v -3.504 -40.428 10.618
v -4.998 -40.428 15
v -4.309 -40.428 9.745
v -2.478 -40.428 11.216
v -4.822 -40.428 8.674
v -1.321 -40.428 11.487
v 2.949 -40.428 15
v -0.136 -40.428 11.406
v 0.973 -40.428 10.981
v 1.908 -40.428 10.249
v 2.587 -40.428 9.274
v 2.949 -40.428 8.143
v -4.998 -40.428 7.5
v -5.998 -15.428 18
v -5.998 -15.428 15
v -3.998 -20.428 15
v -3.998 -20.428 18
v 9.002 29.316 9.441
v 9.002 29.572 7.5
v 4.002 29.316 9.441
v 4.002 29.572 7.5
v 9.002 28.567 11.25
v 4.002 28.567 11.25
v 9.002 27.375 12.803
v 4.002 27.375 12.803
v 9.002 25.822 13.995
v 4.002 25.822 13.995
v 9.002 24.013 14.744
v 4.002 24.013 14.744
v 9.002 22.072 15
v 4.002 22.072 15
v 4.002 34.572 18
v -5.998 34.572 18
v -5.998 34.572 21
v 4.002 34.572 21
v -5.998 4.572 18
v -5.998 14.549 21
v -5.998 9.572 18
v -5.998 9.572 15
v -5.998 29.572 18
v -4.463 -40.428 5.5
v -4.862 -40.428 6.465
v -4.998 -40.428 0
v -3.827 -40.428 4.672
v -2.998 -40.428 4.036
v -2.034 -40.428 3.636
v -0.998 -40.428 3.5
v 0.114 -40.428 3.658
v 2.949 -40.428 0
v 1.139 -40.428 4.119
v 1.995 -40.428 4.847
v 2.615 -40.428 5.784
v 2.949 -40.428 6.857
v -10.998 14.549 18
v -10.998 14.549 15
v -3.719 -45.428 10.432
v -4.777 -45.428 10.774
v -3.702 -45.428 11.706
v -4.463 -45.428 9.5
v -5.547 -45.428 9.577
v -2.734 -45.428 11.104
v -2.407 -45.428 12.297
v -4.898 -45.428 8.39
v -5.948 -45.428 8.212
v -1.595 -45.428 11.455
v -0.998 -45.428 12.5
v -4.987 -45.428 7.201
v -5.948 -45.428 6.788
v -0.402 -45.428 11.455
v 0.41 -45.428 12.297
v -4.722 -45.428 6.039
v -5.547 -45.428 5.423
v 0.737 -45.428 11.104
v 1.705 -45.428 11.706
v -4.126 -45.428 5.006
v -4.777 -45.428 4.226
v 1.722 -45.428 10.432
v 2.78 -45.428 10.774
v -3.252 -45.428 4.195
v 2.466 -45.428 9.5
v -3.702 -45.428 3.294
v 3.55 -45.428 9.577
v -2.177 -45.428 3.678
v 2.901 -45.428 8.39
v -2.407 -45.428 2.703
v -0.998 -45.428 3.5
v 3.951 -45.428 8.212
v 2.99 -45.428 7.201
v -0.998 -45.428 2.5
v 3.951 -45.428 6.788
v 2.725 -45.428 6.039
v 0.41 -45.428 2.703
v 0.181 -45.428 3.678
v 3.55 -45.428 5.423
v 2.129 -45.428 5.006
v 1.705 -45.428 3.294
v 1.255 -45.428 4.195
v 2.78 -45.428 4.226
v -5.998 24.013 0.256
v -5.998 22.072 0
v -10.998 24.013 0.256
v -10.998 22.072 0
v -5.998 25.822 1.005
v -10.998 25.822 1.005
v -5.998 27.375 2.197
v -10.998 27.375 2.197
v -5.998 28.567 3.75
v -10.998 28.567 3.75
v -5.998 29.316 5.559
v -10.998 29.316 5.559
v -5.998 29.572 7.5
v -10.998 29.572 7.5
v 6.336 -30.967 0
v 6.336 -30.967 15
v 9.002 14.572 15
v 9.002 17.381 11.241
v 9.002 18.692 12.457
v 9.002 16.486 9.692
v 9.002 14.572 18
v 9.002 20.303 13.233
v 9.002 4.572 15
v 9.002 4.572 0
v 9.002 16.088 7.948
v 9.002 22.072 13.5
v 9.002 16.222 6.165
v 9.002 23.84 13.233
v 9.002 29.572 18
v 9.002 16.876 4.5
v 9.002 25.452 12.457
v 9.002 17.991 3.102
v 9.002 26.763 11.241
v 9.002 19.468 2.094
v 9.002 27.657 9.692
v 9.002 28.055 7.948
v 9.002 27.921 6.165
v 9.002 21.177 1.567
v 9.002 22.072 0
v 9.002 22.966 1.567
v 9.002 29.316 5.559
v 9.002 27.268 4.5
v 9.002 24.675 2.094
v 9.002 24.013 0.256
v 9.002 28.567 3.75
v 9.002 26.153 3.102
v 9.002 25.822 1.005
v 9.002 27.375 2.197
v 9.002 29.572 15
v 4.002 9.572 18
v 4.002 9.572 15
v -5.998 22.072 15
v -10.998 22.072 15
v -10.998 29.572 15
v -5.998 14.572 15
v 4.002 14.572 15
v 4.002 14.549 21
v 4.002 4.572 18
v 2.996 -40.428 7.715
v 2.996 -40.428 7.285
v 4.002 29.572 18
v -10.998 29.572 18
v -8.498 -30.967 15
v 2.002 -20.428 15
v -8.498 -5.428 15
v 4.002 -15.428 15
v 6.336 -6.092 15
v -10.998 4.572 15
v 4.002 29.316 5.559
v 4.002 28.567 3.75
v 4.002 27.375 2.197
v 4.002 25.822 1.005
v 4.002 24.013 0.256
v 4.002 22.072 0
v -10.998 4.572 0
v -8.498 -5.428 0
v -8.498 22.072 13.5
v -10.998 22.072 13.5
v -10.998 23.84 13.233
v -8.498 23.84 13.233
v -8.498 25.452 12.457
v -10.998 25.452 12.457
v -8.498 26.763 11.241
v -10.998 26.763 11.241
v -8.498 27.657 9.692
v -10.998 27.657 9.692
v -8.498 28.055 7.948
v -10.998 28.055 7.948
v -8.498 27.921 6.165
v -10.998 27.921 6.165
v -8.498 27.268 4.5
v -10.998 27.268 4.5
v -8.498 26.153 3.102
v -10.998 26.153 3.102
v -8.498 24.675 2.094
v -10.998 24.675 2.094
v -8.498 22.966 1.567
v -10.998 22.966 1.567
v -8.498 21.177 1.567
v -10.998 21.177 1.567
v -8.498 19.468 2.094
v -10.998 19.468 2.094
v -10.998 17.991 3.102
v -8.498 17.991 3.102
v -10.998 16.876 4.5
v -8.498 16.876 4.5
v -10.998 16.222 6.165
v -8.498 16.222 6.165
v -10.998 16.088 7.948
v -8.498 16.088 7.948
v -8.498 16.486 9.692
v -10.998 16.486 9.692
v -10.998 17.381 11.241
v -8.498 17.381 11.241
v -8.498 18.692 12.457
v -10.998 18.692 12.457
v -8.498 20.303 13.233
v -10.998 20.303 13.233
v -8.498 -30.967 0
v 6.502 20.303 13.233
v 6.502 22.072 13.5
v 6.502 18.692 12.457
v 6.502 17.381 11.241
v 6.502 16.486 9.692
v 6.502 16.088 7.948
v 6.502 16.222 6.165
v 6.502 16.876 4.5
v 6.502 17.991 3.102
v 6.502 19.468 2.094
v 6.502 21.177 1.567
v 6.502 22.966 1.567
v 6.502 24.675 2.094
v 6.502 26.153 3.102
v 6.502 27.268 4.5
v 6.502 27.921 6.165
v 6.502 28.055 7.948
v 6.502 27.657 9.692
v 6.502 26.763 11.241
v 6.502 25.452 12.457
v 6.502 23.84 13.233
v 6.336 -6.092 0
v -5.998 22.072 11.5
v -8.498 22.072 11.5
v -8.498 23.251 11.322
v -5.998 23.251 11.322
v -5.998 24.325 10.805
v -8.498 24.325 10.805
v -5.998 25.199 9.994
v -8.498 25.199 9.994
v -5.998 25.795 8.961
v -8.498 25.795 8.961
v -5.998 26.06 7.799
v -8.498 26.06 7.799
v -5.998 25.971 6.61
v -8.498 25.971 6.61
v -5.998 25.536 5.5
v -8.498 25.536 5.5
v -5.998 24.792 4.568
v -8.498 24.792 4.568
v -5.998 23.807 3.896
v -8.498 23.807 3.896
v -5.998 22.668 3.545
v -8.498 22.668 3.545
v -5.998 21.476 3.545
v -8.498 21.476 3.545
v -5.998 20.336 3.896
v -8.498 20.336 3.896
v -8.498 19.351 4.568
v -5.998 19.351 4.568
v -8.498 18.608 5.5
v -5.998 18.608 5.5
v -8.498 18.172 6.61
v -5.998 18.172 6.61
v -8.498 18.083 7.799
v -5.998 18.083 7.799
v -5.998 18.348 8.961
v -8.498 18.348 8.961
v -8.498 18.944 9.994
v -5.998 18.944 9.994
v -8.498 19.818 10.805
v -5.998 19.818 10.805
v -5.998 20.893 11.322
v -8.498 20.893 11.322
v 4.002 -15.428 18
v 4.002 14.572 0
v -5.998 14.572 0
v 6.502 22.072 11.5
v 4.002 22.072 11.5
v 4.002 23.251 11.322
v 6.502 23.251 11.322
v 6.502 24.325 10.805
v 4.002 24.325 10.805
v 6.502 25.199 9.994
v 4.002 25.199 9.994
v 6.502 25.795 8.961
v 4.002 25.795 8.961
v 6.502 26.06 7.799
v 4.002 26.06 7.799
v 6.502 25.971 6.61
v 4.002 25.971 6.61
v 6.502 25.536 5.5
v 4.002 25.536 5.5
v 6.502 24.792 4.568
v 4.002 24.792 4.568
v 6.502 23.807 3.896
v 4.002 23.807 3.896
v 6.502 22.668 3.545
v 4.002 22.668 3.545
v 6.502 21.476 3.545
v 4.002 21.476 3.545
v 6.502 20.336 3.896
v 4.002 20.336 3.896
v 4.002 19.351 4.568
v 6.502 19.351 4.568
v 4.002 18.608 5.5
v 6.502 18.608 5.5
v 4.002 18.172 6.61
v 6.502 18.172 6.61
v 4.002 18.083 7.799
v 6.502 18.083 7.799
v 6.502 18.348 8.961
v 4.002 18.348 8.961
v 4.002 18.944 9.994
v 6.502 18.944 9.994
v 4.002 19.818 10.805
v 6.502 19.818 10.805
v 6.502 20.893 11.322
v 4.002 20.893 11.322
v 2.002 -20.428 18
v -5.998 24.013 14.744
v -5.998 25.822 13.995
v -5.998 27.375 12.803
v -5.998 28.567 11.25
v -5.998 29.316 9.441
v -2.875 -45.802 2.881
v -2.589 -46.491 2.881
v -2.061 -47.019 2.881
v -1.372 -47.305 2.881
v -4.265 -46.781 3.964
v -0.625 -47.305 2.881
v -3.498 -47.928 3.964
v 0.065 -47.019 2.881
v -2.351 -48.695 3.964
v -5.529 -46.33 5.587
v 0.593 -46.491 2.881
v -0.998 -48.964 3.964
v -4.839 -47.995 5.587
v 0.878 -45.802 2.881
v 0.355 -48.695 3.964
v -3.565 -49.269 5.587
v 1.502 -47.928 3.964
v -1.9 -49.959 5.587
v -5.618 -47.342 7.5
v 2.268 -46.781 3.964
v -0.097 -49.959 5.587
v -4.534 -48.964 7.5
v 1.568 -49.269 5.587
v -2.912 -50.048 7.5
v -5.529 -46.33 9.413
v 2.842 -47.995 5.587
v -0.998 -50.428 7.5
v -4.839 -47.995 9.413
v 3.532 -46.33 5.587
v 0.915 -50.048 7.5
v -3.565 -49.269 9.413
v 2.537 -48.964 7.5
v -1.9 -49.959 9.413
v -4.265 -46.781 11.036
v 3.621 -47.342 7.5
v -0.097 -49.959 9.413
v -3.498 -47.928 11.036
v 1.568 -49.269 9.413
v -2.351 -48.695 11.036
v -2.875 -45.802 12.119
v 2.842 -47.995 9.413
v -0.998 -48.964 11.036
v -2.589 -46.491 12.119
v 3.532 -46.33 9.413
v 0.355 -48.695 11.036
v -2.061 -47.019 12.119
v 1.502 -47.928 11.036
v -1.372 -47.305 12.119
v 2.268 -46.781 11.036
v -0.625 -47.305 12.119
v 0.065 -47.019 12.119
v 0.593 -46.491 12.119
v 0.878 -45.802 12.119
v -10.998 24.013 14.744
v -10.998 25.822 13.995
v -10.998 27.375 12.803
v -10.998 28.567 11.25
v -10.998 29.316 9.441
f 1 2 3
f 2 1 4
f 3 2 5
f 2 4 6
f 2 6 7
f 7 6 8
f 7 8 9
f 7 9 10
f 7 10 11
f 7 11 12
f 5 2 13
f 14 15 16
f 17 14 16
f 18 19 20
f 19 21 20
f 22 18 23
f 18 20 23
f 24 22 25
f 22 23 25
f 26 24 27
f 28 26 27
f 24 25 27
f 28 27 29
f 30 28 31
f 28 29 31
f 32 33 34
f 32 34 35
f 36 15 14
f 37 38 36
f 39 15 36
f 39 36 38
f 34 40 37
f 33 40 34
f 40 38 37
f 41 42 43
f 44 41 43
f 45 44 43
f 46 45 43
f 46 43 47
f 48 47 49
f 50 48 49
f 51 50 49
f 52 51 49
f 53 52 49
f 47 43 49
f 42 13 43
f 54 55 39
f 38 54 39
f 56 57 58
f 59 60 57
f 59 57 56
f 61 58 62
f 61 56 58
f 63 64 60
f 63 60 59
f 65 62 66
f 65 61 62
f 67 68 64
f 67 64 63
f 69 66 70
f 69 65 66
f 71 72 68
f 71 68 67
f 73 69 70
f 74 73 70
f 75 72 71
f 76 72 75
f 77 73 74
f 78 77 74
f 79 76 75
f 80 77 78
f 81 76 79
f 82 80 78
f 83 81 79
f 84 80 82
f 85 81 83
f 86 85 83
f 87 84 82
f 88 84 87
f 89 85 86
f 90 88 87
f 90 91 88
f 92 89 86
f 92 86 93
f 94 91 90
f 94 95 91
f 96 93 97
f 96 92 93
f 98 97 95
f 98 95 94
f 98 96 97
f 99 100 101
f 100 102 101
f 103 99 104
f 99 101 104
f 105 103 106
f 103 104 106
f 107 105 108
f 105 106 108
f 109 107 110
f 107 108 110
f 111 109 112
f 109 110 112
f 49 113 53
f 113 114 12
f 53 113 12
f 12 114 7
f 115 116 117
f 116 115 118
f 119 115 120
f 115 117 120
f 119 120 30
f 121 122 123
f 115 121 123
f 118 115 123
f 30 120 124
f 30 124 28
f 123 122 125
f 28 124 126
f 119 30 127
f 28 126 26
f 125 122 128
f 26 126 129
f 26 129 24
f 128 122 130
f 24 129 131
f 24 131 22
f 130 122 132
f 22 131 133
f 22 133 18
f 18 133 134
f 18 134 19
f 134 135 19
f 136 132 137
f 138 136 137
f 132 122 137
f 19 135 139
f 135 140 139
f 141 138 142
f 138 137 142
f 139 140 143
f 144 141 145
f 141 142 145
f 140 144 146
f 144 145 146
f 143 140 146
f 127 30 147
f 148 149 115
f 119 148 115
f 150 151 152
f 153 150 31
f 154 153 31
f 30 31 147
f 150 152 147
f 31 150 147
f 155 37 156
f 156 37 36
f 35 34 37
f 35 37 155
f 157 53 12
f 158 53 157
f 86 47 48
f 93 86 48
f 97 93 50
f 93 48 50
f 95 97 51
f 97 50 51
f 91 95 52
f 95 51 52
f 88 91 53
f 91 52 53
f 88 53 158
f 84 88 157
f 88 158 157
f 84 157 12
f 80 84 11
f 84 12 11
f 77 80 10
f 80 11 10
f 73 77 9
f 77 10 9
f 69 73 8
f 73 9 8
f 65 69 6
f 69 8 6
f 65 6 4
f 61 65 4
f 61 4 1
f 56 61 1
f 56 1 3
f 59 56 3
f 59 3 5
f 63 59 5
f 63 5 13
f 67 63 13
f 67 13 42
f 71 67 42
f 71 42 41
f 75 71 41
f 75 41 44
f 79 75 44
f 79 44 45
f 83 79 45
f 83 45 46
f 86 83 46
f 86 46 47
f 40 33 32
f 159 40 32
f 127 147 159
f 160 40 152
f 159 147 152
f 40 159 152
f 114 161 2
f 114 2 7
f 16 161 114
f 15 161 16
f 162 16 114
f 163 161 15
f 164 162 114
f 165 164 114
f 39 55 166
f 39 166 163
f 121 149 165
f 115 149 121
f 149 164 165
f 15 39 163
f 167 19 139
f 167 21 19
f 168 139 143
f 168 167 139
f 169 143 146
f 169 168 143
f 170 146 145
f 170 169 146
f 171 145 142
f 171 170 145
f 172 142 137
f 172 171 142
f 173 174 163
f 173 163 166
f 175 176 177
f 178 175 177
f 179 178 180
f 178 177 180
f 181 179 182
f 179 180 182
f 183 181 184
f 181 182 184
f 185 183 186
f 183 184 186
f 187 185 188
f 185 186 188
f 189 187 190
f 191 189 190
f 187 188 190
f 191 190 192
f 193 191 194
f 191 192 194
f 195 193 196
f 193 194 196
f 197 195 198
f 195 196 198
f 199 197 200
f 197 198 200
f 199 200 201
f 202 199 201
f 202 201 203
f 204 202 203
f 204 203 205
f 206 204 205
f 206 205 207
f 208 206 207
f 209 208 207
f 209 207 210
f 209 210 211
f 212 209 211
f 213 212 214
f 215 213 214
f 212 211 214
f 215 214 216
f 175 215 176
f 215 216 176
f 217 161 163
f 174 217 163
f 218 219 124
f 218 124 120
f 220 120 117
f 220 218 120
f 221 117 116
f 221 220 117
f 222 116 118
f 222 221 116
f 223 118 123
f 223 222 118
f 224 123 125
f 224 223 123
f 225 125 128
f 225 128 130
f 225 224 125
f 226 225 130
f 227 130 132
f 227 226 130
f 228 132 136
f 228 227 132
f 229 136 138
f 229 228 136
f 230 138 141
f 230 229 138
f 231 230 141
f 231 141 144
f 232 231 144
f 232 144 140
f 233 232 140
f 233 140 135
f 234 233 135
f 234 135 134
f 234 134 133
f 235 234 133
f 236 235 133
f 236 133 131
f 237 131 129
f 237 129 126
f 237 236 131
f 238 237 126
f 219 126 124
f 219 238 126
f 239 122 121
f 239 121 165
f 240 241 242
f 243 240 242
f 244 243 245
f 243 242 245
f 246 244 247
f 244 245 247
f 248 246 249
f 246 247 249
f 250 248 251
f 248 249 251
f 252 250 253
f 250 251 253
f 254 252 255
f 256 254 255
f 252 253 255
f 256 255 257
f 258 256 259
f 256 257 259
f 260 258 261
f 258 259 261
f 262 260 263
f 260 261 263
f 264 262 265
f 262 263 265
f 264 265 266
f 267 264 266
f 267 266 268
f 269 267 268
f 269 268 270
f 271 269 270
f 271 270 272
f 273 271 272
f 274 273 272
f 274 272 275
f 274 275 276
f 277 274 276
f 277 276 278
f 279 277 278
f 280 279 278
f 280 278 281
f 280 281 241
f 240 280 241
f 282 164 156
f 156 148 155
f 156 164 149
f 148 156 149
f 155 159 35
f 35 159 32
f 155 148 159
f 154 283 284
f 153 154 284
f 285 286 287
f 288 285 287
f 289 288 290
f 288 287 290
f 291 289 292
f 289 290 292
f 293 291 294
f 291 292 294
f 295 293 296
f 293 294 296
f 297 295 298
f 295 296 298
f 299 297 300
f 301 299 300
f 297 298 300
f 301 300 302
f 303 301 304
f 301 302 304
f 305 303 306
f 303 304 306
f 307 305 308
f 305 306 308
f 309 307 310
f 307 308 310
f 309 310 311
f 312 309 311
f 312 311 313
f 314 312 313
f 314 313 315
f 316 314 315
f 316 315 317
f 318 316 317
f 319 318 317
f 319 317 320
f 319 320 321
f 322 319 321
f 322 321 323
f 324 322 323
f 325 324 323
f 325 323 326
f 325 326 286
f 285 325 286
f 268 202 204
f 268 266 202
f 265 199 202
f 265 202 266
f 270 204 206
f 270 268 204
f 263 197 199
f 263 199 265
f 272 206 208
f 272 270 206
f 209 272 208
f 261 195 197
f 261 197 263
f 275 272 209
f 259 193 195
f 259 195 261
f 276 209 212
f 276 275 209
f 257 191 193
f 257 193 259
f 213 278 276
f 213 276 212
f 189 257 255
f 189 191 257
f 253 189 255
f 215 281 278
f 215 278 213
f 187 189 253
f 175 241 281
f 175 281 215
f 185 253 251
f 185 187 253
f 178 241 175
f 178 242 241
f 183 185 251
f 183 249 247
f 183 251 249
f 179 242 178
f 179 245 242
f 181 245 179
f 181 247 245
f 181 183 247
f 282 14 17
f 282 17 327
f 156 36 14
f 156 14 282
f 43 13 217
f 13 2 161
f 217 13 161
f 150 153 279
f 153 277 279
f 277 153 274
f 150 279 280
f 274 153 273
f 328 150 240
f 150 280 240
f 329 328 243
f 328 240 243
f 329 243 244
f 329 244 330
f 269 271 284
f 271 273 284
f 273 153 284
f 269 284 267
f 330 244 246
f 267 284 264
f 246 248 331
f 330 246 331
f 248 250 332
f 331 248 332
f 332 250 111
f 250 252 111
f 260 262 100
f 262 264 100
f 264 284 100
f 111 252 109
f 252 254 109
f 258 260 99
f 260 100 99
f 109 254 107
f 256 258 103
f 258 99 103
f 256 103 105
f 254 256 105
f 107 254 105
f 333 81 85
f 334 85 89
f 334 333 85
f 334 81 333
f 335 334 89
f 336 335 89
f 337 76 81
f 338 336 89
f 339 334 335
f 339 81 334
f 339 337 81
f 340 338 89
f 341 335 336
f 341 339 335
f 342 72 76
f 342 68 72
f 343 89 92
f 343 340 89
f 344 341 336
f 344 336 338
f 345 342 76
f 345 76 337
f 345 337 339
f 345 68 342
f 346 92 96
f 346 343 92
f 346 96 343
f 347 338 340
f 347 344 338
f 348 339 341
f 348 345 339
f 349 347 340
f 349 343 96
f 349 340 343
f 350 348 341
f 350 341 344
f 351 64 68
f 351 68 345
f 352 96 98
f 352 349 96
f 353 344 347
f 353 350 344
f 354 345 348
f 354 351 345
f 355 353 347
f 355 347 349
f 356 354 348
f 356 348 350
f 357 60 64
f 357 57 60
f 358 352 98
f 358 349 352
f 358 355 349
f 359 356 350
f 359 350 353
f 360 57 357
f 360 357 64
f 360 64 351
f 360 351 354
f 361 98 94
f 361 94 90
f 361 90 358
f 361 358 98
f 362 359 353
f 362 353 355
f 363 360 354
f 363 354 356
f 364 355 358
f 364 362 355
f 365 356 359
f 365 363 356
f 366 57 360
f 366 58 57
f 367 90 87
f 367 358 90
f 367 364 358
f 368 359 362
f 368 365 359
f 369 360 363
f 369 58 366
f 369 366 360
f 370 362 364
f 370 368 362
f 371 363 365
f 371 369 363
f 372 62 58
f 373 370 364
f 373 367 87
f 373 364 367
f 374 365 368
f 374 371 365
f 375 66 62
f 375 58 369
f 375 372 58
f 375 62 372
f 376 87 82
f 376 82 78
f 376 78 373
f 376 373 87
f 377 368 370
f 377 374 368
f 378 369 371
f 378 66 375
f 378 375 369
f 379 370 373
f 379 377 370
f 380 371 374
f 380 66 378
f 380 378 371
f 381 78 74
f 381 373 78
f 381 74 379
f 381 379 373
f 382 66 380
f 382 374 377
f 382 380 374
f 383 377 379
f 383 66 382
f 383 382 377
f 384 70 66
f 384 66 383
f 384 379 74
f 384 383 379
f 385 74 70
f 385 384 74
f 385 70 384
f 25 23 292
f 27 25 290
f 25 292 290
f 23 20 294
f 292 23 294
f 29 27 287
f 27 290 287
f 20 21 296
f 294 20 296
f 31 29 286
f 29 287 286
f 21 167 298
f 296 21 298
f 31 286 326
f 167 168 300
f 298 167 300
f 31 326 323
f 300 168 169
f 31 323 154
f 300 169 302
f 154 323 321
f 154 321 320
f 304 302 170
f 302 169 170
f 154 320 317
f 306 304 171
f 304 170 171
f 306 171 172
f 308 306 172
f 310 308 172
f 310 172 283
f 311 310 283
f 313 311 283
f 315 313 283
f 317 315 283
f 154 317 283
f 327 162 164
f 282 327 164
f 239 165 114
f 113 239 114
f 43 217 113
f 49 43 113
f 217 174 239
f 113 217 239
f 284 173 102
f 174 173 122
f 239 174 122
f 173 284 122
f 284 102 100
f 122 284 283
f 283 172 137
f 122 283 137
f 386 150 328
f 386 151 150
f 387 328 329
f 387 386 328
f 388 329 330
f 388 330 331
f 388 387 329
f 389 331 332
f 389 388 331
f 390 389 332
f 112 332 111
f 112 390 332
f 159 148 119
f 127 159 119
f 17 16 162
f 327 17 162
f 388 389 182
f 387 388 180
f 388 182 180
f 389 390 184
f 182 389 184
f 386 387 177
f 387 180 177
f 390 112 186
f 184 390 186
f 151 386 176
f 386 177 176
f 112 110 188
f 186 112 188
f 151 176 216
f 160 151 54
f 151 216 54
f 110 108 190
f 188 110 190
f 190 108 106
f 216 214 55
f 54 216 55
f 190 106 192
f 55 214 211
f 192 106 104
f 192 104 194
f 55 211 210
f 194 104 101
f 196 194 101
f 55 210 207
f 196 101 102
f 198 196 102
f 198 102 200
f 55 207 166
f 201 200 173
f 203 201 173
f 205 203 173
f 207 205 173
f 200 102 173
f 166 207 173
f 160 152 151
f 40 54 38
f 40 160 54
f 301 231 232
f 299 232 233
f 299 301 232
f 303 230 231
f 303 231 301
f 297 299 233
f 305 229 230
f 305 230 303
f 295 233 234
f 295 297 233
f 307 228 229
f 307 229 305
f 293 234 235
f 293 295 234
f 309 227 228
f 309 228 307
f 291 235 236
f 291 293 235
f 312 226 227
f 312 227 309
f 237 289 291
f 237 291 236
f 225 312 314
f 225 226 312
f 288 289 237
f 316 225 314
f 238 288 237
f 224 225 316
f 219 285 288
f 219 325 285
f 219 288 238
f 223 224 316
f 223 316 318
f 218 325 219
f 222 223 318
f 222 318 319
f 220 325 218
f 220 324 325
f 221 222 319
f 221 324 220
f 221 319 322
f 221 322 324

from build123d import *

# Parameters (mm, degrees)
BOSS_EXTRUDE2_DEPTH = 15
SKETCH2_R           = 4
CUT_EXTRUDE1_DEPTH  = 20
SKETCH3_R           = 6
CUT_EXTRUDE2_DEPTH  = 2.5
CUT_EXTRUDE3_START  = -2.5
SKETCH4_R           = 6
CUT_EXTRUDE3_DEPTH  = 2.5
FILLET1_R           = 7.5
BOSS_EXTRUDE3_DEPTH = 3
SKETCH6_W           = 10
SKETCH6_H           = 30
BOSS_EXTRUDE4_DEPTH = 3
CUT_EXTRUDE4_DEPTH  = 10
SKETCH8_R           = 4
BOSS_EXTRUDE6_DEPTH = 5
REVOLVE3_ANGLE      = 180
CUT_EXTRUDE6_DEPTH  = 15


with BuildPart() as part:
    # Sketch1 → Boss-Extrude2 (new body)
    with BuildSketch(Plane.XY):
        Polygon((4.00158439, 29.571674002), (4.00158439, 14.571674002), (-5.99841561, 14.571674002), (-5.99841561, 29.571674002), (-10.99841561, 29.571674002), (-10.99841561, -40.428325998), (9.00158439, -40.428325998), (9.00158439, 29.571674002), align=None)
    extrude(amount=BOSS_EXTRUDE2_DEPTH)

    # Sketch2 → Cut-Extrude1 (cut)
    with BuildSketch(Plane.ZY.offset(10.99841561)):
        with Locations((7.5, 22.071674002)):
            Circle(SKETCH2_R)
    extrude(amount=-CUT_EXTRUDE1_DEPTH, mode=Mode.SUBTRACT)

    # Sketch3 → Cut-Extrude2 (cut)
    with BuildSketch(Plane.ZY.offset(10.99841561)):
        with Locations((7.5, 22.071674002)):
            Circle(SKETCH3_R)
    extrude(amount=-CUT_EXTRUDE2_DEPTH, mode=Mode.SUBTRACT)

    # Sketch4 → Cut-Extrude3 (cut)
    with BuildSketch(Plane(origin=(9.00158439, 0, 0), x_dir=(0, 0, -1), z_dir=(1, 0, 0)).offset(CUT_EXTRUDE3_START)):
        with Locations(Location((-7.5, 22.071674002, 0), (0, 0, 180))):
            Circle(SKETCH4_R)
    extrude(amount=CUT_EXTRUDE3_DEPTH, mode=Mode.SUBTRACT)

    # Fillet1
    fillet1_edges = [part.edges().sort_by_distance(p)[0] for p in [
        (6.50158439, 29.571674002, 0),
        (6.50158439, 29.571674002, 15),
        (-8.49841561, 29.571674002, 0),
        (-8.49841561, 29.571674002, 15),
    ]]
    fillet(fillet1_edges, radius=FILLET1_R - 0.0001)  # a hair under: the kernel refuses the full size

    # Sketch5 → Boss-Extrude3 (add)
    with BuildSketch(Plane.XY.offset(15)):
        Polygon((-5.99841561, 9.571674002), (-5.99841561, -15.428325998), (-3.99841561, -20.428325998), (2.00158439, -20.428325998), (4.00158439, -15.428325998), (4.00158439, 9.571674002), (9.00158439, 14.571674002), (9.00158439, 29.571674002), (-10.99841561, 29.571674002), (-10.99841561, 14.548804666), align=None)
    extrude(amount=BOSS_EXTRUDE3_DEPTH)

    # Sketch6 → Boss-Extrude4 (add)
    with BuildSketch(Plane.XY.offset(18)):
        with Locations((-0.99841561, 19.571674002)):
            Rectangle(SKETCH6_W, SKETCH6_H)
    extrude(amount=BOSS_EXTRUDE4_DEPTH)

    # Sketch7 → Cut-Extrude4 (cut)
    with BuildSketch(Plane.ZY.offset(5.99841561)):
        Polygon((21, 14.548804666), (18, 4.571674002), (21, 4.571674002), align=None)
    extrude(amount=-CUT_EXTRUDE4_DEPTH, mode=Mode.SUBTRACT)

    # Sketch8 → Boss-Extrude6 (add)
    with BuildSketch(Plane.XZ.offset(40.428325998)):
        with Locations(Location((-0.99841561, 7.5, 0), (0, 0, 270))):
            Circle(SKETCH8_R)
    extrude(amount=BOSS_EXTRUDE6_DEPTH)

    # Sketch9 → Revolve3 (revolve)
    with BuildSketch(Plane(origin=(0, -45.428325998, 0), x_dir=(-1, 0, 0), z_dir=(0, -1, 0))):
        with BuildLine():
            Line((0.99841561, -12.5), (0.99841561, -2.5))
            ThreePointArc((0.99841561, -2.5), (5.99841561, -7.5), (0.99841561, -12.5))
        make_face()
    revolve(axis=Axis((-0.99841561, -45.428325998, 12.5), (0, 0, 1)), revolution_arc=REVOLVE3_ANGLE)

    # Sketch10 → Cut-Extrude6 (cut)
    with BuildSketch(Plane.XY.offset(15)):
        Polygon((6.335572216, -30.967221552), (2.949498735, -40.428325998), (9.00158439, -40.428325998), (9.00158439, 4.571674002), (6.335572216, -6.092374694), align=None)
        Polygon((-8.49841561, -24.415311945), (-8.49841561, -5.428325998), (-10.99841561, 4.571674002), (-10.99841561, -40.428325998), (-4.99841561, -40.428325998), (-8.49841561, -30.967221552), align=None)
    extrude(amount=-CUT_EXTRUDE6_DEPTH, mode=Mode.SUBTRACT)


solid = part.part
